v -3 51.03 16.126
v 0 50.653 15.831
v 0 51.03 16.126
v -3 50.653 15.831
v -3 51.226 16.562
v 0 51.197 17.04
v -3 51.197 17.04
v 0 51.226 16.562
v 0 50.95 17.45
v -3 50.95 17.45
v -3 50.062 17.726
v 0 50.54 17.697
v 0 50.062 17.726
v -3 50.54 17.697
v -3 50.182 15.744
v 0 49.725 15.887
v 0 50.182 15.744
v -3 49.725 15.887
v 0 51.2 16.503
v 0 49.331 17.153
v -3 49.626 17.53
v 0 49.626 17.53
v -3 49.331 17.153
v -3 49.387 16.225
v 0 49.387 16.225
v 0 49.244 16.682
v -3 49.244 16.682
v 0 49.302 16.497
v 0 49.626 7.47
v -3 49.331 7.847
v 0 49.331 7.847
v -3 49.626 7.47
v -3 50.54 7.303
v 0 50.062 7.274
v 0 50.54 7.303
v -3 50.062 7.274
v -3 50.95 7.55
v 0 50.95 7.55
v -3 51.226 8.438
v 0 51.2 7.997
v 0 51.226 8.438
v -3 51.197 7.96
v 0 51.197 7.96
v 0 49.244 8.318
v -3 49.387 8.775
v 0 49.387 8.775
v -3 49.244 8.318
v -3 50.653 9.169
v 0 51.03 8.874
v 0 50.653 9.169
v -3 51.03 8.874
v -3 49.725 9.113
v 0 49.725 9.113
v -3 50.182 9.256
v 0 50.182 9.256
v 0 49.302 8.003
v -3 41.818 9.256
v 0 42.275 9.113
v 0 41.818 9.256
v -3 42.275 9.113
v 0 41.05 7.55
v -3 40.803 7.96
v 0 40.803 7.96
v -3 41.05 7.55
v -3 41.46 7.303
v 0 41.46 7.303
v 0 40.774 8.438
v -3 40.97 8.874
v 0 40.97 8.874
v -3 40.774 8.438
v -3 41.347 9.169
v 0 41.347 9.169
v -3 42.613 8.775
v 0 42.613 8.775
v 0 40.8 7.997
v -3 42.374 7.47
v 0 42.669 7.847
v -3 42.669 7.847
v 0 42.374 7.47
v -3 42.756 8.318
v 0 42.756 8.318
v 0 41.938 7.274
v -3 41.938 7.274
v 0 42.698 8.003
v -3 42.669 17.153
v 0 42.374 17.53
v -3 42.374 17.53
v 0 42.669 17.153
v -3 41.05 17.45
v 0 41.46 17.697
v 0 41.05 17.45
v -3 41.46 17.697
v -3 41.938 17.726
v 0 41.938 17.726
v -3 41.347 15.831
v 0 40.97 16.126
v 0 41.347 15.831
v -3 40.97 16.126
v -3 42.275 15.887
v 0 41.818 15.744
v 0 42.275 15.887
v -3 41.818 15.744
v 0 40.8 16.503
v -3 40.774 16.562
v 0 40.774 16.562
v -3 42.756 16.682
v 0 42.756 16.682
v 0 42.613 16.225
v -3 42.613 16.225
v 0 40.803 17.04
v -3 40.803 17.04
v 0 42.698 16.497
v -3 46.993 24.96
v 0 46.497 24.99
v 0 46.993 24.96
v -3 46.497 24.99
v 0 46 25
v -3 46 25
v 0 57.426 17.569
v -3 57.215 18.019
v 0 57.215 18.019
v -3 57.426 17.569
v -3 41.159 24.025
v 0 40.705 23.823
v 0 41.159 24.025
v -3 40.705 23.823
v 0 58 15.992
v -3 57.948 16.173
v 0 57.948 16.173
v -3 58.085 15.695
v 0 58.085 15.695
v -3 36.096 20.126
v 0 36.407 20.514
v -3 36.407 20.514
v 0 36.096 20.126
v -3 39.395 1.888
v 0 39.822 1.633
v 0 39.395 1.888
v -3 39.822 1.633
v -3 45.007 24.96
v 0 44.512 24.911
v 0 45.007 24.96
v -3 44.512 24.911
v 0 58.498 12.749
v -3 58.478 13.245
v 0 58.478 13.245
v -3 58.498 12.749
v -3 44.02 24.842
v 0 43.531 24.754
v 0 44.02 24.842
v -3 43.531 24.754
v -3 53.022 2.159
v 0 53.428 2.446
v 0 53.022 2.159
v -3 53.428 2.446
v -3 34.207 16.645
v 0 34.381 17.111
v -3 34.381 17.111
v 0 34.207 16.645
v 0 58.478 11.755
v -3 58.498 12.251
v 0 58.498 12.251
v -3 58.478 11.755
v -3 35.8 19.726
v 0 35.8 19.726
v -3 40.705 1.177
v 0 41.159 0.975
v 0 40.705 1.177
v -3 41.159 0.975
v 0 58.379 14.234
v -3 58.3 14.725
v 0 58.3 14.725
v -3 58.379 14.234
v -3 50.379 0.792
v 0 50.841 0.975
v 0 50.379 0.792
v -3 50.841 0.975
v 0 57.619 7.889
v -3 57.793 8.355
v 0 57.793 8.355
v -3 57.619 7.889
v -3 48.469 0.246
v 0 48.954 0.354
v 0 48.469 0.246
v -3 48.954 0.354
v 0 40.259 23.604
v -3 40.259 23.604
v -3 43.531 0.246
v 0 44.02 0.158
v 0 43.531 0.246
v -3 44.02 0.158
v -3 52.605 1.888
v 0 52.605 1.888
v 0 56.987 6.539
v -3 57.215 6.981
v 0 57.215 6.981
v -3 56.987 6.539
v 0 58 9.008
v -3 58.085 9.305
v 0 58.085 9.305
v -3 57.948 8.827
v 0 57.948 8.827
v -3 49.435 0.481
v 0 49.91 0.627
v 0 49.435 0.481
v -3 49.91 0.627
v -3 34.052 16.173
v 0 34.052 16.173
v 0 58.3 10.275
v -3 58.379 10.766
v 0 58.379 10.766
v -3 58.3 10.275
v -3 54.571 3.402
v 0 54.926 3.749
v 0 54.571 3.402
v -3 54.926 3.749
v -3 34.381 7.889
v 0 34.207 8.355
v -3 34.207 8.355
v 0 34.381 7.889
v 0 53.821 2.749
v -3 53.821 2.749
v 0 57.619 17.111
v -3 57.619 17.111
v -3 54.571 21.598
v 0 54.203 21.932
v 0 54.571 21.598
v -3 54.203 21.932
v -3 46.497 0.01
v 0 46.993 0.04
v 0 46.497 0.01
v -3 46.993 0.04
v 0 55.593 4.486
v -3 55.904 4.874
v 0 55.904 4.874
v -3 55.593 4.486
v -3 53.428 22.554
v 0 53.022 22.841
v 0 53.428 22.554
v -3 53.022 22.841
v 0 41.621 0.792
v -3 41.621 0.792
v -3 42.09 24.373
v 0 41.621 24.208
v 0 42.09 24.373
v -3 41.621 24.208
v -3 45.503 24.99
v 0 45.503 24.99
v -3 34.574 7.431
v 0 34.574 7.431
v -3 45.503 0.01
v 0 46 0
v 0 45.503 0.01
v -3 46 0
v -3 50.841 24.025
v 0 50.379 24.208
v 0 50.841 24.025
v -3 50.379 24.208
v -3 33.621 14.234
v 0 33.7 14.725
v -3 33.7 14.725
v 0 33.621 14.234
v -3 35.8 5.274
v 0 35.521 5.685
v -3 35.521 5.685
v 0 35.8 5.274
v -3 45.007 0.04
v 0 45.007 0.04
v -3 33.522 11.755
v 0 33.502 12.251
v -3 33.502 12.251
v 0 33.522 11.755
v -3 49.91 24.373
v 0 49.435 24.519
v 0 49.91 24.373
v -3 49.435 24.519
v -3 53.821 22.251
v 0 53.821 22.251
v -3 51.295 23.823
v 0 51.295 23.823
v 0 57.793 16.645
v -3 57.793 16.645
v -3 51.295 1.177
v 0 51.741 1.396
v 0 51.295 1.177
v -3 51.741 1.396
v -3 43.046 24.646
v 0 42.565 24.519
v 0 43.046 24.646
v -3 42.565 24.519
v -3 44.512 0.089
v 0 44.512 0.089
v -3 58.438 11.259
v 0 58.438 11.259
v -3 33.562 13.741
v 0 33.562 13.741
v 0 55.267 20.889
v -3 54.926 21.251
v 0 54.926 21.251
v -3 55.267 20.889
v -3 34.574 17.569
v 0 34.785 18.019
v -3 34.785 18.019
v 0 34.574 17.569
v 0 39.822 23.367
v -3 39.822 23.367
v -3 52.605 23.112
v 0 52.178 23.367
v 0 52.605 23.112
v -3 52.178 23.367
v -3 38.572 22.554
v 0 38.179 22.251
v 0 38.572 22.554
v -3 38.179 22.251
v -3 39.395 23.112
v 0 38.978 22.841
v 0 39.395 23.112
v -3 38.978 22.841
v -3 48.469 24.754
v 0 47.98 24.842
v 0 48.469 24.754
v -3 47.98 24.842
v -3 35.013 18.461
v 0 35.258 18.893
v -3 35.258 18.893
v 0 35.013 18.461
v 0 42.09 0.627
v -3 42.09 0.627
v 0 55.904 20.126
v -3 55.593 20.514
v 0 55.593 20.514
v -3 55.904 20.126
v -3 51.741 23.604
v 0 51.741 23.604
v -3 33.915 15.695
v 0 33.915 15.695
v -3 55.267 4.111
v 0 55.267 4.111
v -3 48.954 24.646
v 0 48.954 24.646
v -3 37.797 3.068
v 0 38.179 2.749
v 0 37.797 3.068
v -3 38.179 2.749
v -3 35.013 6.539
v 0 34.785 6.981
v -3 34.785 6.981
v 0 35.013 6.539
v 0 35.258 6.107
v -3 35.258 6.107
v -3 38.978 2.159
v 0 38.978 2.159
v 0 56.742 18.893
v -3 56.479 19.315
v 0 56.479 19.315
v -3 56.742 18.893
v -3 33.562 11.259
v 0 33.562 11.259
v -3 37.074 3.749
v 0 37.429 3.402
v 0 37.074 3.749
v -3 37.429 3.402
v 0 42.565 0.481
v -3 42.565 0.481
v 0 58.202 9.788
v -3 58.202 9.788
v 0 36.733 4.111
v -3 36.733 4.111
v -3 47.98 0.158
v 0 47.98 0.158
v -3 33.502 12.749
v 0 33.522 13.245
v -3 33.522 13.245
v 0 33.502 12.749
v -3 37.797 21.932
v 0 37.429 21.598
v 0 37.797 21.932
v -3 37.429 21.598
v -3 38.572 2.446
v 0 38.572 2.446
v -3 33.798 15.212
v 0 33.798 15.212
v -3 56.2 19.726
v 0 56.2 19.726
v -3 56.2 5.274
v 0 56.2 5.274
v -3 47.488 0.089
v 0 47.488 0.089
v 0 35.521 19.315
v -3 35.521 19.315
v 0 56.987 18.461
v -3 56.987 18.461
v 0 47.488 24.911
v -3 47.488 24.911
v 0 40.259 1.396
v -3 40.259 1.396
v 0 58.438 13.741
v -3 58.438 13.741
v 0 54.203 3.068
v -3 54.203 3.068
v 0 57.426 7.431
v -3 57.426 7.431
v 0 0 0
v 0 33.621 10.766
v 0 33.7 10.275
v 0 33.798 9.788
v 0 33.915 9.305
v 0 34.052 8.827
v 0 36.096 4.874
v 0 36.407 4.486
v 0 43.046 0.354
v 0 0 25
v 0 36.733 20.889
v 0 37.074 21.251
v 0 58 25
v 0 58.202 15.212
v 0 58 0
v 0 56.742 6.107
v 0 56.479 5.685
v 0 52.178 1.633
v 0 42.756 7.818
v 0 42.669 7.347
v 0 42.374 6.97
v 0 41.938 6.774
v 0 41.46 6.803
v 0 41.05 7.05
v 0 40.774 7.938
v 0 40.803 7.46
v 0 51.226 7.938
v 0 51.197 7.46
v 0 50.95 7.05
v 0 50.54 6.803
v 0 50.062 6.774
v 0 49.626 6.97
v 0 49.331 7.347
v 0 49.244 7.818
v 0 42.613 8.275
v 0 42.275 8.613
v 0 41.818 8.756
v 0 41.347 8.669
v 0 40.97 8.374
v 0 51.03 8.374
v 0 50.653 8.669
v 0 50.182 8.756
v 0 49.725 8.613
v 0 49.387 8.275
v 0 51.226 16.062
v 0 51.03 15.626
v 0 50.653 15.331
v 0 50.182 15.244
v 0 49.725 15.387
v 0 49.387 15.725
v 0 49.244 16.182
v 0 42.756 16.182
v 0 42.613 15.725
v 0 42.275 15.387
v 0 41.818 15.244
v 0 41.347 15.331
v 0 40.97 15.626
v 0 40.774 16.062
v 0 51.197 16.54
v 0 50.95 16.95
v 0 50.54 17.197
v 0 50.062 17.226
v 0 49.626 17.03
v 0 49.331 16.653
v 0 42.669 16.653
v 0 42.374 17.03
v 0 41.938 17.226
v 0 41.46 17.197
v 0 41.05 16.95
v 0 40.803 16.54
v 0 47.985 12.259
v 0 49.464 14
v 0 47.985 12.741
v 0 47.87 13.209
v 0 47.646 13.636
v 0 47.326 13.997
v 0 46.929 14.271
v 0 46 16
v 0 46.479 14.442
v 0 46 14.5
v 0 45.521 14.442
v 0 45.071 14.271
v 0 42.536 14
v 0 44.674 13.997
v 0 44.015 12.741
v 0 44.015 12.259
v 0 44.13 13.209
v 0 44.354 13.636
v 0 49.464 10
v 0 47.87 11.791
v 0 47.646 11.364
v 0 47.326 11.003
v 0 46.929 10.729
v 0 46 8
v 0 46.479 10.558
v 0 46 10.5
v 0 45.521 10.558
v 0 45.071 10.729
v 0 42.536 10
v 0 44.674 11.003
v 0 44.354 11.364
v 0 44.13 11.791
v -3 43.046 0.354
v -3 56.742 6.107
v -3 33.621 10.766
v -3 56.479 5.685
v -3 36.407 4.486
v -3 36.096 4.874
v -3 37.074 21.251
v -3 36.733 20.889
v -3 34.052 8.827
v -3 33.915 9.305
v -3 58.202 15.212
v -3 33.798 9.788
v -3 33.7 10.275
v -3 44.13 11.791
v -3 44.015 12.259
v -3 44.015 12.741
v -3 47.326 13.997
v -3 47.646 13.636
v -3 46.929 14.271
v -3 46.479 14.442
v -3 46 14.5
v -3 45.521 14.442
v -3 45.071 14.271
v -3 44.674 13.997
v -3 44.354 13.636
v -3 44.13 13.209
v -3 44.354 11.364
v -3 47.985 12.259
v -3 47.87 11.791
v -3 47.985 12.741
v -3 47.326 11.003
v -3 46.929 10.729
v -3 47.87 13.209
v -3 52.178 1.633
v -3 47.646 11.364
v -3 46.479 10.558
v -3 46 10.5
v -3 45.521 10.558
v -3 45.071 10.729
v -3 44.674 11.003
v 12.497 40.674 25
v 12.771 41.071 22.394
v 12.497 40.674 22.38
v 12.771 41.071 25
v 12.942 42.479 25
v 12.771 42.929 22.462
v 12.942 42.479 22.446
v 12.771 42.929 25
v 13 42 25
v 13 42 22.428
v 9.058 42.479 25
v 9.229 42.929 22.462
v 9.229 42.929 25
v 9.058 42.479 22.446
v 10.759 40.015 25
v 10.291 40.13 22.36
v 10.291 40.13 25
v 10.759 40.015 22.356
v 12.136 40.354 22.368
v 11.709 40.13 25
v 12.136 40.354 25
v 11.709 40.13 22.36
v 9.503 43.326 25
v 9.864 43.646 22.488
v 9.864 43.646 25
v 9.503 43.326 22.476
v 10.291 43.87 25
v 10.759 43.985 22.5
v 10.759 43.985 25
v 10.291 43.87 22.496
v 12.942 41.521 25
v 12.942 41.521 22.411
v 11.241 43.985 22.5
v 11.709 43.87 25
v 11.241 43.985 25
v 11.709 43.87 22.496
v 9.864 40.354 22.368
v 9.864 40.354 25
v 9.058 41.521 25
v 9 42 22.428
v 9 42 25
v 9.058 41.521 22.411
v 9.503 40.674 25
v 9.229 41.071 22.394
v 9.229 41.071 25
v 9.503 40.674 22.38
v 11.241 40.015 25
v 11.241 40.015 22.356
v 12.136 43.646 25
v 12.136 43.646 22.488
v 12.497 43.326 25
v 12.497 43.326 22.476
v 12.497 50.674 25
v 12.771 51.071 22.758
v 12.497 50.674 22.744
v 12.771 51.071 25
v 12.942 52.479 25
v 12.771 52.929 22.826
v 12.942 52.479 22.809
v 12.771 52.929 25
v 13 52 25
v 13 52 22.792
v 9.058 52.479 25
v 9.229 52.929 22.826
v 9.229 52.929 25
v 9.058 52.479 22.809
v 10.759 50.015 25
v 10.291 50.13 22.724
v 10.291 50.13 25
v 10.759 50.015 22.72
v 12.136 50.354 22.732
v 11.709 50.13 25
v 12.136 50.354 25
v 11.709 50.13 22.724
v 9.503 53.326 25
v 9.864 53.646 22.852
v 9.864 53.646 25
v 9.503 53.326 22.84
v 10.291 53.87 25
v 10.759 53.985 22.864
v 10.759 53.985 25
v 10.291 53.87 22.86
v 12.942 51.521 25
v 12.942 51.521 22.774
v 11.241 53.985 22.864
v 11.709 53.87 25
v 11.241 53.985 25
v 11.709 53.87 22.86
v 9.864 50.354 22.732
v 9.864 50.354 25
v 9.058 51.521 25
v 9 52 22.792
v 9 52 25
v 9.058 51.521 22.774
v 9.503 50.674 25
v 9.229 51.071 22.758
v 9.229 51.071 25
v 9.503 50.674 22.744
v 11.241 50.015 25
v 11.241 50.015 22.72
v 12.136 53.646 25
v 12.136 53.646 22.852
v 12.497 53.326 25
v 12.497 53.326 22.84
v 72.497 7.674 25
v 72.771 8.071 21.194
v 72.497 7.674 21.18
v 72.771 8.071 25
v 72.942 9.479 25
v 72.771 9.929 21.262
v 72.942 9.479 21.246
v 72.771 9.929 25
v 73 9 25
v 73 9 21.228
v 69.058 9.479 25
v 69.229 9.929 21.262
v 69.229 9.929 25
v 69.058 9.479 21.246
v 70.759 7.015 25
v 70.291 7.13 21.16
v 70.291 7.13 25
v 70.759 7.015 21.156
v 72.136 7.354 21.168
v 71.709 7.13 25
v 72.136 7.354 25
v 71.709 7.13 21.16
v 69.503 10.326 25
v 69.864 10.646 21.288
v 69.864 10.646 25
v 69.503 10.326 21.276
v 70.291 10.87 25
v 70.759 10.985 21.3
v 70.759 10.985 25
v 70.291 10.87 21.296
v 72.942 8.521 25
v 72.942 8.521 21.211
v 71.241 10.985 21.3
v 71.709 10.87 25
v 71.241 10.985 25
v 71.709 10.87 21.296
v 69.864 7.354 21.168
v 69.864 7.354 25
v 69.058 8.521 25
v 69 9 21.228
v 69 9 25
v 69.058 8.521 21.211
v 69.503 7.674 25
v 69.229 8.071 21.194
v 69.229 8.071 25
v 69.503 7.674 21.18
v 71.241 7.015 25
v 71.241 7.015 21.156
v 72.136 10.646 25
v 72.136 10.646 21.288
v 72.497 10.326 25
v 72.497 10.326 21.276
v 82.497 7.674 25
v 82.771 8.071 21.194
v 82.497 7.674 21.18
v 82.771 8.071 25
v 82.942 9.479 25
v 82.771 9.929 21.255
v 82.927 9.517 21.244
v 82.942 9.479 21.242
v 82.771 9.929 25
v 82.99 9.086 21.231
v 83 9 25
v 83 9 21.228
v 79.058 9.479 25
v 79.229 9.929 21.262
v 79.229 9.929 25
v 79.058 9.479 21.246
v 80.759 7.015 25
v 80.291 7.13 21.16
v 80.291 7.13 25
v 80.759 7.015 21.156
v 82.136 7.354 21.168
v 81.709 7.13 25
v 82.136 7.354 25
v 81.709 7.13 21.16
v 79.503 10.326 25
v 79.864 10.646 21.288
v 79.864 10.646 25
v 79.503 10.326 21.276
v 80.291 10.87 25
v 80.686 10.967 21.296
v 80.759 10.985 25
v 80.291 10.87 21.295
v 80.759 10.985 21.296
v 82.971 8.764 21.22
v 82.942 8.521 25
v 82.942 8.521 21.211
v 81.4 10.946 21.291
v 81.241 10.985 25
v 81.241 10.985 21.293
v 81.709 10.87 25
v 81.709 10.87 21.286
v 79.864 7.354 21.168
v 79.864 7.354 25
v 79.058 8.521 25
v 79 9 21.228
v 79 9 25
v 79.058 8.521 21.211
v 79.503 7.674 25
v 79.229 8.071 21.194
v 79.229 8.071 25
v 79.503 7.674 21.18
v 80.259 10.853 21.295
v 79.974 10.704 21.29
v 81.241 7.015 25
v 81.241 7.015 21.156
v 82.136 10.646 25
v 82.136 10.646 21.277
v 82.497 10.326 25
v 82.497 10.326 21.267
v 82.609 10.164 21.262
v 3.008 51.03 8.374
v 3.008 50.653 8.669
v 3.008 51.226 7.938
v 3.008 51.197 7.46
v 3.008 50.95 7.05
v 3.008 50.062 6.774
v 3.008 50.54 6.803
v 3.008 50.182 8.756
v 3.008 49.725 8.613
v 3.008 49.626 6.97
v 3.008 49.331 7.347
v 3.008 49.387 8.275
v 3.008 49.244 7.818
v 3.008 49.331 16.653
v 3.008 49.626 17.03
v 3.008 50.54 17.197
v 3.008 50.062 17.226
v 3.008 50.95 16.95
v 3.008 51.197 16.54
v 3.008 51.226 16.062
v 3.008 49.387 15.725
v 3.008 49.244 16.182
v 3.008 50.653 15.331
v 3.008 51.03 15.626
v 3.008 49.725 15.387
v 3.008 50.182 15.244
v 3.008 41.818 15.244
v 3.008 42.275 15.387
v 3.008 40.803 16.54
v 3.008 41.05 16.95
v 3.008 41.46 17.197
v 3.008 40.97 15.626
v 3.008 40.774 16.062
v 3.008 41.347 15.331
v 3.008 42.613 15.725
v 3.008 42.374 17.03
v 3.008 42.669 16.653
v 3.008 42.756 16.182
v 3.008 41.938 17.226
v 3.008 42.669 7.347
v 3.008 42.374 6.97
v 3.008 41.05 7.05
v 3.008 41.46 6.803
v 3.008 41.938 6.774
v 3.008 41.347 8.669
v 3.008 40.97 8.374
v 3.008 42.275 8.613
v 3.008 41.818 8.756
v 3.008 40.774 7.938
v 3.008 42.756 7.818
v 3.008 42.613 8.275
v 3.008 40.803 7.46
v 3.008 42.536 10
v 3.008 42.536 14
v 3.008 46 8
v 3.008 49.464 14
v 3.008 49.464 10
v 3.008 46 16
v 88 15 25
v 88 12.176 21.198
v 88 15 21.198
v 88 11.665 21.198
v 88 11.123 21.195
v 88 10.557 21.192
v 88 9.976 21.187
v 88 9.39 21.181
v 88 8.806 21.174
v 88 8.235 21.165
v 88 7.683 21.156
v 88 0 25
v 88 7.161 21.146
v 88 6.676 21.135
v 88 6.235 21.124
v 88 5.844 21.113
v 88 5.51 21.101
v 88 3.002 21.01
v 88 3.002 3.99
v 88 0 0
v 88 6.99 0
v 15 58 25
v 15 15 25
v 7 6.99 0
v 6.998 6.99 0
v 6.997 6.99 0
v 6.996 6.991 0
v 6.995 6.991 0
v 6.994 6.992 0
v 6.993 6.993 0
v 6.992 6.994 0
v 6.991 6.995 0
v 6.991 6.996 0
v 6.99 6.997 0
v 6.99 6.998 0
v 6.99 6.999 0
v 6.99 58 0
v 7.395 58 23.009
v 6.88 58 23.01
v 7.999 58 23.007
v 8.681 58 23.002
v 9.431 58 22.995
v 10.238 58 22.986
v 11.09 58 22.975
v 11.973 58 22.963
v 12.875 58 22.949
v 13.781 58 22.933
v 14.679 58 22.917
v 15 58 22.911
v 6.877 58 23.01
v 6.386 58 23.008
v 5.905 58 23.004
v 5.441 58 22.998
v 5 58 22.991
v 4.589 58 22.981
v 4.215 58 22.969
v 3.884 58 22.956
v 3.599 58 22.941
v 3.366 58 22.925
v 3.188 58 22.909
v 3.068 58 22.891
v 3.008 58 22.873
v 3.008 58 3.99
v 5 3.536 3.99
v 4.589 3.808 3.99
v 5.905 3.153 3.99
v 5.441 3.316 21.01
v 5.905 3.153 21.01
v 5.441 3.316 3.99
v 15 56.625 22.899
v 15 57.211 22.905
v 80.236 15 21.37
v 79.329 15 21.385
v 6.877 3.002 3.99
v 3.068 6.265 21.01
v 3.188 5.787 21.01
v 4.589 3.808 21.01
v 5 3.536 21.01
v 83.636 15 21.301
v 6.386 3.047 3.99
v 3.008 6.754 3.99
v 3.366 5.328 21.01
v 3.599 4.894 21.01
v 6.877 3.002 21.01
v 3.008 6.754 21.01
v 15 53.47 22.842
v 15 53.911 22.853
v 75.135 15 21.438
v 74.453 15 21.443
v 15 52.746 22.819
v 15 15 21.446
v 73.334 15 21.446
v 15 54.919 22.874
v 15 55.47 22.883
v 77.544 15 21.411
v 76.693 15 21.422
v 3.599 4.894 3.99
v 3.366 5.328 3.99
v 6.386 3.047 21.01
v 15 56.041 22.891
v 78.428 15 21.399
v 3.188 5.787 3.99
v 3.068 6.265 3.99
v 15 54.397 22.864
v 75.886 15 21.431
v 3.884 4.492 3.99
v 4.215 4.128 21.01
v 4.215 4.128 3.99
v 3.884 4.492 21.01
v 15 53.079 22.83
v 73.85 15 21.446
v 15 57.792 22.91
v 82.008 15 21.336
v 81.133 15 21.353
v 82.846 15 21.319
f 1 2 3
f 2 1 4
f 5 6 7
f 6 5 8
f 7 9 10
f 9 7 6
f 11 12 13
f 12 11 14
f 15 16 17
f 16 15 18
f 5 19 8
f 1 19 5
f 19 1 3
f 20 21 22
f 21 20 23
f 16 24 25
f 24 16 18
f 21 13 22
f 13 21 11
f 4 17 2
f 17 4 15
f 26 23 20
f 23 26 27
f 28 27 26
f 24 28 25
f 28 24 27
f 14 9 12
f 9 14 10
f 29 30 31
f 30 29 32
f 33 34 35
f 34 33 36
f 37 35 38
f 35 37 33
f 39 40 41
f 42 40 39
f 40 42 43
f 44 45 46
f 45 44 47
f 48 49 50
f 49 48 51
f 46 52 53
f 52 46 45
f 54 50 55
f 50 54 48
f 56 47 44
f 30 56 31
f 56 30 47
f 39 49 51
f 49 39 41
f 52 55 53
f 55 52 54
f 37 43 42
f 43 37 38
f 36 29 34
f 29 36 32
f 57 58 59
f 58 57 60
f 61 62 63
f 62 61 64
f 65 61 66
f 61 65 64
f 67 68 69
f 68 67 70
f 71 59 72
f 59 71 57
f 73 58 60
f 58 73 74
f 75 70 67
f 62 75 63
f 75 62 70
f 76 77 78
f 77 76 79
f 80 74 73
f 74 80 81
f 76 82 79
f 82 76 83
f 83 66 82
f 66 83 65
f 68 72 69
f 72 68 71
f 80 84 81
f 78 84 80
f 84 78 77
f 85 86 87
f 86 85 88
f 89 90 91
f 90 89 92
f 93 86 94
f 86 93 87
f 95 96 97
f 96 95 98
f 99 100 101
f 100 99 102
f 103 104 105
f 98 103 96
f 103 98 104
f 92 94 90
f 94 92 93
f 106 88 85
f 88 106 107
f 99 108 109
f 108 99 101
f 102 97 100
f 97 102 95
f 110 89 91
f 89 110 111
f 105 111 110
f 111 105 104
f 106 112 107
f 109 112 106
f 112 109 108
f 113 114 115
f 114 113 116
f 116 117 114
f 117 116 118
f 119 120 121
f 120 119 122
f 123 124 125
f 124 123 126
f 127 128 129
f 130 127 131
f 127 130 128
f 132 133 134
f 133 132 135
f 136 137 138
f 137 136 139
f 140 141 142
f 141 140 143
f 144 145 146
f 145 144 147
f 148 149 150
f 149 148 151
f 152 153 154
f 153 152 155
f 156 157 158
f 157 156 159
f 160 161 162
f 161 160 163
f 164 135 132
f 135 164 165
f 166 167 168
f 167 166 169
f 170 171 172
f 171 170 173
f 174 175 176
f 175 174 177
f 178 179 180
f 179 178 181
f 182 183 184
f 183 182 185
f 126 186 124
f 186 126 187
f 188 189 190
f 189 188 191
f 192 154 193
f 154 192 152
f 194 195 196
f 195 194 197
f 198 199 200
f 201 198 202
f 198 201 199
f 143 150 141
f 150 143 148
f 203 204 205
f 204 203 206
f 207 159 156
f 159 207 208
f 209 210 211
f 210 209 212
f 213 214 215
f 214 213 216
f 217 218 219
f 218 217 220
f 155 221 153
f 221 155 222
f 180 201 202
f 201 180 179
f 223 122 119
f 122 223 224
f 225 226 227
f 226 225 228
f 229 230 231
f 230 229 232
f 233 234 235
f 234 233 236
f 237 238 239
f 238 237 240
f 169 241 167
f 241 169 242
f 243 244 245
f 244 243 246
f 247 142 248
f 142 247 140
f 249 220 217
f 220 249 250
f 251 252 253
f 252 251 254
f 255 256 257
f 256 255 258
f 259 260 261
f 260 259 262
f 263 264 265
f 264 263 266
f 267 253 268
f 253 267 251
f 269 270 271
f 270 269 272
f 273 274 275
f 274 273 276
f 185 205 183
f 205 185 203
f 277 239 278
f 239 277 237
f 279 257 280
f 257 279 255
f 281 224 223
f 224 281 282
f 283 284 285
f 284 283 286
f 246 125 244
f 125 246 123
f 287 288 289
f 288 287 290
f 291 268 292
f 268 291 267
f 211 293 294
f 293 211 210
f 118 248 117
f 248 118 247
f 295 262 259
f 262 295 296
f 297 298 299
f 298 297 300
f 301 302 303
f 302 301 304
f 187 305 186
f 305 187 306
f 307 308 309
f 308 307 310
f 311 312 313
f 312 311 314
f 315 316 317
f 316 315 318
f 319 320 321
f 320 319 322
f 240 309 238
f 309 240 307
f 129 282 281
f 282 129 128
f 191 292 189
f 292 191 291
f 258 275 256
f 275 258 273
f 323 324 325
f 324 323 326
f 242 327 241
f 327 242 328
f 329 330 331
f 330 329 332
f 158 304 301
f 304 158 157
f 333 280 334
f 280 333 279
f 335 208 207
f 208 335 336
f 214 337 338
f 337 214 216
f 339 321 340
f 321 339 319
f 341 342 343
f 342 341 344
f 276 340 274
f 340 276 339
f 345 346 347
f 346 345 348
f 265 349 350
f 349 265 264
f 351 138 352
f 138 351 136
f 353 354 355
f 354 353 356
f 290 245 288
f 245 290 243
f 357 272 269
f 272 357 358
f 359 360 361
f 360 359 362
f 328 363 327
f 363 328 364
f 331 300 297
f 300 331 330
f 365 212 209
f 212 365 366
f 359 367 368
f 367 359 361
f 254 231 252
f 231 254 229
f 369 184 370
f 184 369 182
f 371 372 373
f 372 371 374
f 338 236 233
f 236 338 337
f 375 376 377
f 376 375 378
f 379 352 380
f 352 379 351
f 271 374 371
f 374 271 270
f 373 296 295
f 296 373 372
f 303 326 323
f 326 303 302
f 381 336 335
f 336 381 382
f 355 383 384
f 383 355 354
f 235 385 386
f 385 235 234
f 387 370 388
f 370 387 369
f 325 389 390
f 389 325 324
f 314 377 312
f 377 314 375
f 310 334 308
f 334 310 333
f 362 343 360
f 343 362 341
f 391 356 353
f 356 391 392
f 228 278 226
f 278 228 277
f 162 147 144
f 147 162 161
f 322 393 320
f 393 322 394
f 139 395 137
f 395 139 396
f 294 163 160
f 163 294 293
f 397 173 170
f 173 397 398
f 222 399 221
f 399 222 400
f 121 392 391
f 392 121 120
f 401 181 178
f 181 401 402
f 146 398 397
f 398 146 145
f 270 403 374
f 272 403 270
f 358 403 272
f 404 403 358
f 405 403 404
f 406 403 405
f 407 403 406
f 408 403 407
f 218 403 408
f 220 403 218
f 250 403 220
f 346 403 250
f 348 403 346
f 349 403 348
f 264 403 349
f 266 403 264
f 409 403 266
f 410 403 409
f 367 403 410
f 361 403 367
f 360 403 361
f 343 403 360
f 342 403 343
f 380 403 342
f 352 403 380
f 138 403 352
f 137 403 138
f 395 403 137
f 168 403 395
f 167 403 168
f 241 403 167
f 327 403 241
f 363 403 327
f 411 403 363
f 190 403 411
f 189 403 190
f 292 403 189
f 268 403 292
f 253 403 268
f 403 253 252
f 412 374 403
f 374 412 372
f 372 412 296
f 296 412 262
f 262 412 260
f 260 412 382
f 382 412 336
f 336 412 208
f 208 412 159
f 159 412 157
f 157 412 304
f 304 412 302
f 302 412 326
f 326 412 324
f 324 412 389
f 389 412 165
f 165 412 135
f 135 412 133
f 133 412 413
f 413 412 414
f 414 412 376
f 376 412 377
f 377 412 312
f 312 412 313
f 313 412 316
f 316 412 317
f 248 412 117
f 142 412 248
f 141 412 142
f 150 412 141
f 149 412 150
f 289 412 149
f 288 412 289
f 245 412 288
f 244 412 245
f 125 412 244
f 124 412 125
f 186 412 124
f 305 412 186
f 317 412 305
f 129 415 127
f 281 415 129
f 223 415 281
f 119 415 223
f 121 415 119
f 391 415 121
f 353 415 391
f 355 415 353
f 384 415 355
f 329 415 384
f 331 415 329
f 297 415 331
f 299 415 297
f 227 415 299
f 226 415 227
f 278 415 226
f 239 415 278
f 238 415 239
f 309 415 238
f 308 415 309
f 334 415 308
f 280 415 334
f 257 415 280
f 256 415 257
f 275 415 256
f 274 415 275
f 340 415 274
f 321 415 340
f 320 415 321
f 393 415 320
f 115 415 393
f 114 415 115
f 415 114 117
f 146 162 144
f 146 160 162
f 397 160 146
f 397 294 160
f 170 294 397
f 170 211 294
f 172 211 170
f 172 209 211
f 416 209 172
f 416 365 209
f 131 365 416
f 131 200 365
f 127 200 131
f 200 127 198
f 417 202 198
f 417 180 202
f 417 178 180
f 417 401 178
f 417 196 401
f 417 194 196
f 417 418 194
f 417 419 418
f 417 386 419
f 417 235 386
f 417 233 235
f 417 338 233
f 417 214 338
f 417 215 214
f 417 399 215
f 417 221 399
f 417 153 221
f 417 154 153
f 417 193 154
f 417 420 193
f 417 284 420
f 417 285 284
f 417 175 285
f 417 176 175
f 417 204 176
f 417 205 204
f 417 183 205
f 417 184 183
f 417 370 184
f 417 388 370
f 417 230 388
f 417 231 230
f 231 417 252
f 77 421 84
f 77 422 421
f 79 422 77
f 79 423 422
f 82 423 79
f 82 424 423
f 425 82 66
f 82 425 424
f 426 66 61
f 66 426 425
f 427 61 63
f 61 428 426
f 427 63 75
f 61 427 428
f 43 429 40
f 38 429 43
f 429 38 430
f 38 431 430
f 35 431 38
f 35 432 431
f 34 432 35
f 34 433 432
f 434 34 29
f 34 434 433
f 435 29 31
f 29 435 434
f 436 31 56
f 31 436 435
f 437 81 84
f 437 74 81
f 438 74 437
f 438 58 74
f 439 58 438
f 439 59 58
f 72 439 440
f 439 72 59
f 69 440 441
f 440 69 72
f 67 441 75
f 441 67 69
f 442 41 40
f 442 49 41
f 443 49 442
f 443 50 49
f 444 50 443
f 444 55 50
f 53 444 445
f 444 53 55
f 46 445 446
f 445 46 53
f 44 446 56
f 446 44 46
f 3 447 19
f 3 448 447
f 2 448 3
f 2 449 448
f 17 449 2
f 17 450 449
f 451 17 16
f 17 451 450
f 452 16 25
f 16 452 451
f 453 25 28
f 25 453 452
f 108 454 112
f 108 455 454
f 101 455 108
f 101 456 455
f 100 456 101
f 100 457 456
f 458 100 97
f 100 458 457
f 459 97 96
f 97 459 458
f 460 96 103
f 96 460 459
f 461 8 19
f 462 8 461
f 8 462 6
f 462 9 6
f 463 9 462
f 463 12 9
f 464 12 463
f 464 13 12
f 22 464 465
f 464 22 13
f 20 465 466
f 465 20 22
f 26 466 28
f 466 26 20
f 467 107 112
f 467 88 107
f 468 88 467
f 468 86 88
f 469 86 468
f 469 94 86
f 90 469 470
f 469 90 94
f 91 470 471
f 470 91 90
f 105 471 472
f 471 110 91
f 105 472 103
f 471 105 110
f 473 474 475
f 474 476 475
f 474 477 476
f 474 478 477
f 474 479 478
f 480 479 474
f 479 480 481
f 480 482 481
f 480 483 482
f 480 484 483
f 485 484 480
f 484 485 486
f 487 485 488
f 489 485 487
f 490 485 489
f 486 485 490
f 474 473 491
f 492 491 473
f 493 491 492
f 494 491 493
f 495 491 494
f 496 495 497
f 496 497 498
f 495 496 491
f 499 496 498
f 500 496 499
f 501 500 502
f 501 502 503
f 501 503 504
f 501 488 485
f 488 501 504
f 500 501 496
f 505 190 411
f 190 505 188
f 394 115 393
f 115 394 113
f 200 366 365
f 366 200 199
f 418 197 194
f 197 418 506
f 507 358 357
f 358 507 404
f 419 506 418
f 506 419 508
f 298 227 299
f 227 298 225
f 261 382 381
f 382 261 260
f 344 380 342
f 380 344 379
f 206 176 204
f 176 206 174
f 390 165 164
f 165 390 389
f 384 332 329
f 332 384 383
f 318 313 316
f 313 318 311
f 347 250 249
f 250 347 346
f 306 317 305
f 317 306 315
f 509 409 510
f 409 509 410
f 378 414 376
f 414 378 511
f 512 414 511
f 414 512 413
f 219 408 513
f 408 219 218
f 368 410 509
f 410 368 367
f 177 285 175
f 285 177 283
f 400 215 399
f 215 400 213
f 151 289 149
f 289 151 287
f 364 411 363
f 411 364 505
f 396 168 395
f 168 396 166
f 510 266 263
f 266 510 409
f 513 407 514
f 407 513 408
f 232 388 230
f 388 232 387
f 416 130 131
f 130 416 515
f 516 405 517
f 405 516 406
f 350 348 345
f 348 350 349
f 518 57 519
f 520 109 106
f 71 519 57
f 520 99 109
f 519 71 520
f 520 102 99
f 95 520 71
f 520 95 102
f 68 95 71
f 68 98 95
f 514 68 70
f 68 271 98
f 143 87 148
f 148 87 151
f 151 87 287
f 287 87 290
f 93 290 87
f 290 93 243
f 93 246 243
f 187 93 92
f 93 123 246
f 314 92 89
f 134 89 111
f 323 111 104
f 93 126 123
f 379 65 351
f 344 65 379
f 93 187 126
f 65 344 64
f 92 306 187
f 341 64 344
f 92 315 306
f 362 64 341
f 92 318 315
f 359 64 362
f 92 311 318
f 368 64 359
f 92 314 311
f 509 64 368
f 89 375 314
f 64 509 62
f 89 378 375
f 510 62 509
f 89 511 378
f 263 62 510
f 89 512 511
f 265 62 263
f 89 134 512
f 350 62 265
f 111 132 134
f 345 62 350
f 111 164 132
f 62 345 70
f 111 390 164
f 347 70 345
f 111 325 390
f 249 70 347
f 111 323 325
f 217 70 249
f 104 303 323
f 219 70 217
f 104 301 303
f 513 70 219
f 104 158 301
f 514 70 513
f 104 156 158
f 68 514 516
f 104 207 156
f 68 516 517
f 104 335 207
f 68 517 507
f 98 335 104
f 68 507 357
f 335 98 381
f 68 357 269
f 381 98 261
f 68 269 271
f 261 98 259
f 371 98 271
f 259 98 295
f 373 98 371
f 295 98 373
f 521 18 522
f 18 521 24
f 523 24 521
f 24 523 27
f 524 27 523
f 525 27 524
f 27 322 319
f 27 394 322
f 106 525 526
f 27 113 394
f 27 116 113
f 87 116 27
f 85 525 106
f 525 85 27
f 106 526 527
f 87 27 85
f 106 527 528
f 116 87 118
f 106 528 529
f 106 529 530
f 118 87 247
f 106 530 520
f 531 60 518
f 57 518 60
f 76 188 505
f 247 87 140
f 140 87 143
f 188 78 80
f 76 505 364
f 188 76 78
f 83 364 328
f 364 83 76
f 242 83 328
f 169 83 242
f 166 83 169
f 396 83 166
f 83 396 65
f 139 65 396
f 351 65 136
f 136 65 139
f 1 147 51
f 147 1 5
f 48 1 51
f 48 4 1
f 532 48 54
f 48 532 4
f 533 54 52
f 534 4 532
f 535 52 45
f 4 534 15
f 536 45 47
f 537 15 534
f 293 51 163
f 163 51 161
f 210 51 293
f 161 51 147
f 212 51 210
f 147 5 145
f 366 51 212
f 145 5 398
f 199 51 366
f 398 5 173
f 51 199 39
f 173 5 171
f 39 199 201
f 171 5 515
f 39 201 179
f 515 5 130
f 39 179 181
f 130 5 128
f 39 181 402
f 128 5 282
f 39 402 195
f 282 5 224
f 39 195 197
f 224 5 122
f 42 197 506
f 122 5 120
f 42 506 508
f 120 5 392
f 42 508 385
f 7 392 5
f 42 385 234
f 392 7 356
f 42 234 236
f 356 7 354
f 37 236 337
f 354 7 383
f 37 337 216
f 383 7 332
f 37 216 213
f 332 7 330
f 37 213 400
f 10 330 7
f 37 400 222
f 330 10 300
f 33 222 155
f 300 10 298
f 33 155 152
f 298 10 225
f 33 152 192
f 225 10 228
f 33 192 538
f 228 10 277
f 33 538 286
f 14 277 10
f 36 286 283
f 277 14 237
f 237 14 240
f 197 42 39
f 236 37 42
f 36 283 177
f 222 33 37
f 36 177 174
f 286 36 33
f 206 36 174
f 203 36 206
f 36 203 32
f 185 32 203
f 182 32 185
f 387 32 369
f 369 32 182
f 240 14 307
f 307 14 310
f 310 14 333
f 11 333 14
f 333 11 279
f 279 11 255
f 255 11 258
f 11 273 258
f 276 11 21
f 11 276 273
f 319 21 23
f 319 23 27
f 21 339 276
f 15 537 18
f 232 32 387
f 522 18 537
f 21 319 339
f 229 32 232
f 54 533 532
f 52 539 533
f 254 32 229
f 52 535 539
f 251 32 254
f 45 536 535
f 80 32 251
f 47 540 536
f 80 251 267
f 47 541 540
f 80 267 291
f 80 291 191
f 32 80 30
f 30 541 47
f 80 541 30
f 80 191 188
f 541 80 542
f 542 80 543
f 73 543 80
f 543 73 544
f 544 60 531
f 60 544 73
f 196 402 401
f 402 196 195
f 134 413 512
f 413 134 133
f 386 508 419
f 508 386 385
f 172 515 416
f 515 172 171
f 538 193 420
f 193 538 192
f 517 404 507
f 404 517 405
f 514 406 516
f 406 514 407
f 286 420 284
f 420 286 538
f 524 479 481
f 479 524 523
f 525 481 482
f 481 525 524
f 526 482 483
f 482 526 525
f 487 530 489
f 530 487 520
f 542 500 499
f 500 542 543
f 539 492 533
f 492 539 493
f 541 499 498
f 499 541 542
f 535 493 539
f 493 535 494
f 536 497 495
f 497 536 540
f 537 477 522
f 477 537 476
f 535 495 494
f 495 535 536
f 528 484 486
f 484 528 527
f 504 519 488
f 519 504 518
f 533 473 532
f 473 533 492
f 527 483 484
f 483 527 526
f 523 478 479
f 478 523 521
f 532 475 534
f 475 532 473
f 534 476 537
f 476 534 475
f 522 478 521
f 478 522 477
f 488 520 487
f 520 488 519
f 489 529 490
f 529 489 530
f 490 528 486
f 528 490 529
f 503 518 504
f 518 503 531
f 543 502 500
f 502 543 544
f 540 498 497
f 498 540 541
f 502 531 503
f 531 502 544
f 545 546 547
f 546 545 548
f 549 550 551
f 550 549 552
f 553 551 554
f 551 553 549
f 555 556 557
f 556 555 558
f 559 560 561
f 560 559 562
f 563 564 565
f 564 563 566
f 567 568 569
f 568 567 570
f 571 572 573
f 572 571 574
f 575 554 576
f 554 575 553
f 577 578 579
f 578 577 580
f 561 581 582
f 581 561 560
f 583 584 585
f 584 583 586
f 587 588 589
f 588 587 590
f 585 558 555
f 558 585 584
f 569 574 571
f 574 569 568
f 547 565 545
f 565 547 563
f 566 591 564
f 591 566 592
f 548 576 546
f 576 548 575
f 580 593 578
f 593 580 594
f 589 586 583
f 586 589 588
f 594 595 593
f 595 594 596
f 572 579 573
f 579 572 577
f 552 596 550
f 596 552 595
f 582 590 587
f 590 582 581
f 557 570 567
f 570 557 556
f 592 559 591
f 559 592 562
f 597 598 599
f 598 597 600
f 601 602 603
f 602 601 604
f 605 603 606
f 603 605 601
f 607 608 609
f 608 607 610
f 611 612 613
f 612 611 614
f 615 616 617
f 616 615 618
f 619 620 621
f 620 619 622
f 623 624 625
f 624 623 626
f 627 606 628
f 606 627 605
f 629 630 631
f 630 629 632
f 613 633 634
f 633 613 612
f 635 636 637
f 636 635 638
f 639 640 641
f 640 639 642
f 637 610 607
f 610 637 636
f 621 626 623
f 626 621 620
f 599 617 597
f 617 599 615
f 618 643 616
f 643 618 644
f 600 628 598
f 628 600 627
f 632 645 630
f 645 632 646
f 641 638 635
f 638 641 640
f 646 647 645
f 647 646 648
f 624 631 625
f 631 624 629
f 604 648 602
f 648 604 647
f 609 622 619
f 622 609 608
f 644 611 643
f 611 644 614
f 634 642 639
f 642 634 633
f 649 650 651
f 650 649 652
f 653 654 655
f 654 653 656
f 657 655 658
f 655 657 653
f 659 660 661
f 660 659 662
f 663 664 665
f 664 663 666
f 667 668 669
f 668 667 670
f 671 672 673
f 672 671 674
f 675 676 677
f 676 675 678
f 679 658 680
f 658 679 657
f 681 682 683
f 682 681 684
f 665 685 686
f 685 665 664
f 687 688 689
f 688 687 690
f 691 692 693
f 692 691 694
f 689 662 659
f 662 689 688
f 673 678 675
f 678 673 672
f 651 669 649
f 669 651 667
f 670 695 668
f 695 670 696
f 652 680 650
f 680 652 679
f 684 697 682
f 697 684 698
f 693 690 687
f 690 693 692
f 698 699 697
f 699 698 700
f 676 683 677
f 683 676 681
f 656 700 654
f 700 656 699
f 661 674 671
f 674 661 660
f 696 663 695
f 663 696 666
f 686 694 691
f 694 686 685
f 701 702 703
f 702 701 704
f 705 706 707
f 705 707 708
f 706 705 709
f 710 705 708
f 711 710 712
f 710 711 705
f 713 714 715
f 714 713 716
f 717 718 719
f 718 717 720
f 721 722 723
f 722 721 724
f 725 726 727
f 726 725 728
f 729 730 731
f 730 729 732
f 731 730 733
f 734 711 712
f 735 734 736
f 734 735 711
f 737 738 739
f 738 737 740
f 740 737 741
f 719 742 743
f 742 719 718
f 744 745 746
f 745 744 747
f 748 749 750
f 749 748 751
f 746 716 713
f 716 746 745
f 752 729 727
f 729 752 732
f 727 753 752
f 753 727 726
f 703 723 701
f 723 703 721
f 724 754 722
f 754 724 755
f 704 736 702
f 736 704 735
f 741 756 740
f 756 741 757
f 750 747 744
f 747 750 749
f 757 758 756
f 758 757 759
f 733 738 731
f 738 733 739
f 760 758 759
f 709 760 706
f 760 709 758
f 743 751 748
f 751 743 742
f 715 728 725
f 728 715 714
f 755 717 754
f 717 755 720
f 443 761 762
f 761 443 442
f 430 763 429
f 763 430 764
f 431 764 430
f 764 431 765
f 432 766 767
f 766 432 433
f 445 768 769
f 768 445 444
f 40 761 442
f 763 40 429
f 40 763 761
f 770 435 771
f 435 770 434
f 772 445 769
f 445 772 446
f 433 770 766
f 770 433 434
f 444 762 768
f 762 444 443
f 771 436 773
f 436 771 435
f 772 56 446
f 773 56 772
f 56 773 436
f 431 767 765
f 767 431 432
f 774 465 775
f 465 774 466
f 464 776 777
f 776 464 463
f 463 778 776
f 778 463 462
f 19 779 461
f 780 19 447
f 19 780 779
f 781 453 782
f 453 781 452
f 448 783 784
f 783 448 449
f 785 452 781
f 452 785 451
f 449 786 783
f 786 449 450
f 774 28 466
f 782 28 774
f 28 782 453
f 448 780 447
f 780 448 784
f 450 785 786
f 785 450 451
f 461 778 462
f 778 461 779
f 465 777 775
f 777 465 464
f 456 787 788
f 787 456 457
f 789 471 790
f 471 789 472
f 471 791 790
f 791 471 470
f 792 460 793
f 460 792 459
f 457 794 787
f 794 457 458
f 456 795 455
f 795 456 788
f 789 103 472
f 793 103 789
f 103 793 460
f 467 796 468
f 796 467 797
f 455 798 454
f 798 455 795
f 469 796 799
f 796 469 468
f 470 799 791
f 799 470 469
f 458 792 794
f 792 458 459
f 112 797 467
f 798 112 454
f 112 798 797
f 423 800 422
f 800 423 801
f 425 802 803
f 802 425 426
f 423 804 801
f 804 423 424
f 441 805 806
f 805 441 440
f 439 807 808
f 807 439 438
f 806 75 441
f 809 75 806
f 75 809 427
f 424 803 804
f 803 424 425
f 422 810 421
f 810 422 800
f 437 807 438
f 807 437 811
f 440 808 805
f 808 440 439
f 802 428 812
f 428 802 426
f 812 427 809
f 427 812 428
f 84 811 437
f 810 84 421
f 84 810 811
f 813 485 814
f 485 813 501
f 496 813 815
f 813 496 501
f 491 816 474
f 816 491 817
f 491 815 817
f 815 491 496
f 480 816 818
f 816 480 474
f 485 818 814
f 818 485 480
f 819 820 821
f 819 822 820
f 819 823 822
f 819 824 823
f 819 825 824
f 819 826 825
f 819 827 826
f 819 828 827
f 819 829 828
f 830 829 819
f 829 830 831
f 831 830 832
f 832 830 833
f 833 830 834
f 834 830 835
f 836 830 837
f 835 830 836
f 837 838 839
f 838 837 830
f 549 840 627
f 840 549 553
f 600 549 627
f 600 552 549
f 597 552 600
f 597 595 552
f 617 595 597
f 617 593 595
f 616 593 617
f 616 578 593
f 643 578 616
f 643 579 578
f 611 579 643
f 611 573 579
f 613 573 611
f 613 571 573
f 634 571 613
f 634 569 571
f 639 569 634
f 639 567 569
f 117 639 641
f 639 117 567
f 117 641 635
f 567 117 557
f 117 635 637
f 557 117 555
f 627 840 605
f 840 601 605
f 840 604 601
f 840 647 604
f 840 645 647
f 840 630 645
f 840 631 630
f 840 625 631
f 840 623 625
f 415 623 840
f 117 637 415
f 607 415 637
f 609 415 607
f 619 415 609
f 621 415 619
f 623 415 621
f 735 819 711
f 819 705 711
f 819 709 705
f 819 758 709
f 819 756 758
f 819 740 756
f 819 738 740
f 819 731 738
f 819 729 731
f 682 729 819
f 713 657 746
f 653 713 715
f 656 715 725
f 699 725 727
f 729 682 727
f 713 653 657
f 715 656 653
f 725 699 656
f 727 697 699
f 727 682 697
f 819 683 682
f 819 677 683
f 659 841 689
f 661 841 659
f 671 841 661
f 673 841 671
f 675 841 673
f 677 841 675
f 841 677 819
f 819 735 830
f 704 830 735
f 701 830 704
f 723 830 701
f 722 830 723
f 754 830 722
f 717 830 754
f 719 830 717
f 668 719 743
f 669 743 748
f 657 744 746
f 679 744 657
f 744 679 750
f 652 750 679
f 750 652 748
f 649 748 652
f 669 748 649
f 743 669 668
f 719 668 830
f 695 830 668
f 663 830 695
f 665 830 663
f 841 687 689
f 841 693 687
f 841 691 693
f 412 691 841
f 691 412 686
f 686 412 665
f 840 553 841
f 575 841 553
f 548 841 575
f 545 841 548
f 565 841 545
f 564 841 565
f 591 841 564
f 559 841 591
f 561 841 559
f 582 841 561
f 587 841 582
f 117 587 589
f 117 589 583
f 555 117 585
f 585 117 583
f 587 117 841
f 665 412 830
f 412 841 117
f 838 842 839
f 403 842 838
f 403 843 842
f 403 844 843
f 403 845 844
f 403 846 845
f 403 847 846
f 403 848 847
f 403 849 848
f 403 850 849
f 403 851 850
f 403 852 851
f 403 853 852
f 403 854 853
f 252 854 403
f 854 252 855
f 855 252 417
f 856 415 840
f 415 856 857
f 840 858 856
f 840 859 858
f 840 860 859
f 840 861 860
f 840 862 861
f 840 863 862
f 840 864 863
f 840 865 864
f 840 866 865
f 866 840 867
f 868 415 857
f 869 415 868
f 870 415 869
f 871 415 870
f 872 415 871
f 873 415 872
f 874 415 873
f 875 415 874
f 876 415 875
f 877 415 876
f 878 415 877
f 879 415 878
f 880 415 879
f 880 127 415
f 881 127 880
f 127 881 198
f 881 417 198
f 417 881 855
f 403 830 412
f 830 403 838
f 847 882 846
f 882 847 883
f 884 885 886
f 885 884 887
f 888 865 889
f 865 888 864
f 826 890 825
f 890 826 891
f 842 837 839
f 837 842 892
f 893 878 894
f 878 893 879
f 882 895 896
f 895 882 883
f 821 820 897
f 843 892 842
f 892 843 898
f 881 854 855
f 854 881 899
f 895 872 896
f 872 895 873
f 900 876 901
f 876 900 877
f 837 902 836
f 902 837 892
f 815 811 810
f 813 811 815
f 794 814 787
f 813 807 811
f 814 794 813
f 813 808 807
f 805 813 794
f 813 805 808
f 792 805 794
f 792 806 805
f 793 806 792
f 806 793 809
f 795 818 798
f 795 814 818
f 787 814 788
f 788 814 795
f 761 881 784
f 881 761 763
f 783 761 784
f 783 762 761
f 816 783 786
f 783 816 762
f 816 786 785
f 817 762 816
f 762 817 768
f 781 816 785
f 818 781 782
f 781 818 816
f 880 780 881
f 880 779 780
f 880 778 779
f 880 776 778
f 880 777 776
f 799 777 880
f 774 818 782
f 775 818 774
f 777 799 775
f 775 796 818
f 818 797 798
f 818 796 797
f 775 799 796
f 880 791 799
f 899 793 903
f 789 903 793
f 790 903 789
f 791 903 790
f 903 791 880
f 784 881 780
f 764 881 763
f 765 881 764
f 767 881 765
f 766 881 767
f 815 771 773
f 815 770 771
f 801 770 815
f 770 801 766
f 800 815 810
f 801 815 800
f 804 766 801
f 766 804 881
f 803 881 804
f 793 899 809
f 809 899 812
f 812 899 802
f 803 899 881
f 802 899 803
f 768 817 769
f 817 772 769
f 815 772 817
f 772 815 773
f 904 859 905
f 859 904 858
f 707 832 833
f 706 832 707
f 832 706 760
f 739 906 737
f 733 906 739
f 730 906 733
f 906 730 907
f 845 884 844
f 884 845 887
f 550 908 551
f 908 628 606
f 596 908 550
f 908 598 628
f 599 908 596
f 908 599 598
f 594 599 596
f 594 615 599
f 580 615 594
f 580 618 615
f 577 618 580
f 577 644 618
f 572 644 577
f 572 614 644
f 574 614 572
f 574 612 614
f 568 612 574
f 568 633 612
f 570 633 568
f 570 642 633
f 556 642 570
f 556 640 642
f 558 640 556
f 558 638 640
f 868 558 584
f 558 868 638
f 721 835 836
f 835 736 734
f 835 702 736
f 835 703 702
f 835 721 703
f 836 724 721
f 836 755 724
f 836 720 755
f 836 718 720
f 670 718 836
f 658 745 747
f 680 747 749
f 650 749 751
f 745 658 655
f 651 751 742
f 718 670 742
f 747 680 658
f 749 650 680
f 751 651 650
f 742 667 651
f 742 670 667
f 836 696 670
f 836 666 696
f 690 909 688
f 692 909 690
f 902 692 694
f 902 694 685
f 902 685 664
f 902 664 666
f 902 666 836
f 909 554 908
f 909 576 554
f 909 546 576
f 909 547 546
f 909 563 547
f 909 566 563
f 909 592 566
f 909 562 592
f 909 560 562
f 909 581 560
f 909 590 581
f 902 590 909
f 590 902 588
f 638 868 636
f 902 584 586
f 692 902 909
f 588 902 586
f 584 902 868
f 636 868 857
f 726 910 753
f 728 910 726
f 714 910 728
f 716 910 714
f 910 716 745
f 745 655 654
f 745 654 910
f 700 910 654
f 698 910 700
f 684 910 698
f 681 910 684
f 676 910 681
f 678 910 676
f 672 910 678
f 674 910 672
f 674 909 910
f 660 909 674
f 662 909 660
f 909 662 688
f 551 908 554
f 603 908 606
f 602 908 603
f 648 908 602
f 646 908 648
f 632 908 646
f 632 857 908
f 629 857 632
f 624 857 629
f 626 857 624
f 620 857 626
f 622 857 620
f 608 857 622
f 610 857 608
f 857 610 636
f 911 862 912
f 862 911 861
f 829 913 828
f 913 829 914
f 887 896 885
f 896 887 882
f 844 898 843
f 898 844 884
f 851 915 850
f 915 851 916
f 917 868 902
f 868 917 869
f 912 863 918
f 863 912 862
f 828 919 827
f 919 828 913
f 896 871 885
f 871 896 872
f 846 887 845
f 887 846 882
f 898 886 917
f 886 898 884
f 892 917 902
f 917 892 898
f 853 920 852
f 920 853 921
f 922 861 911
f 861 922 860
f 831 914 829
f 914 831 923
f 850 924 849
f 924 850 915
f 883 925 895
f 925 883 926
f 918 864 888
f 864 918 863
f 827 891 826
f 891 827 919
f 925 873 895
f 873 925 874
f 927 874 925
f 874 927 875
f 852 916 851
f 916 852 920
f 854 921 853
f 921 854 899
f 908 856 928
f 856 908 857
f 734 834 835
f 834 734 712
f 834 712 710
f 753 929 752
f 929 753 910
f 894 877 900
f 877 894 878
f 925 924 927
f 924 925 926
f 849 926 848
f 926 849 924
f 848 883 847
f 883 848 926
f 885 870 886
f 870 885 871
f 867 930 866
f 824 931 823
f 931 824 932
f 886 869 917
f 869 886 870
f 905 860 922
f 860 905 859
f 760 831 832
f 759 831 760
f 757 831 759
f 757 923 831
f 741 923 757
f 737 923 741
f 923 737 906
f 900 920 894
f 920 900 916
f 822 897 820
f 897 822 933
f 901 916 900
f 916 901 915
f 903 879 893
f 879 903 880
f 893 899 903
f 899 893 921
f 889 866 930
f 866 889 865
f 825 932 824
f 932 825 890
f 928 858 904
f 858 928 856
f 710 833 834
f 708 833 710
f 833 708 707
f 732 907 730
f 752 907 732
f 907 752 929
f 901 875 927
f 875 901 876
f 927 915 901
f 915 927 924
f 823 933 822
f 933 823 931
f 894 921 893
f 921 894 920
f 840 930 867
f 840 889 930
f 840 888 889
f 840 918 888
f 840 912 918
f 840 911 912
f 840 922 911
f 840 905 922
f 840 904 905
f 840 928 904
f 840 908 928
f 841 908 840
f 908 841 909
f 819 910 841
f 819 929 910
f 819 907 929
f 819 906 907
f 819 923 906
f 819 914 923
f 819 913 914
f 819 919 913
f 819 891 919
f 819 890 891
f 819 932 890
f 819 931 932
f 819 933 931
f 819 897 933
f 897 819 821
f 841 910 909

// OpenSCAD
//Bracket for holding Cytronix CM6 HDMI external monitor
width=85;
height=55;
wall=3;
depth=21;
taper=4;
$fa=1/1;
$fs=1/2;
bissl=1/100;
d_bolt=4;
d_nut=8;
h_nut=4;
bcd=12;
n_screws=4;
d_circle=2;
back_plate=4;
module bracket() {
  difference() {
    cube([width+wall,height+wall,depth+back_plate]);
    hull() {
      for (t=[[taper+wall,taper+wall,0],[taper+wall+width,taper+wall,0],[taper+wall+width,taper+wall+height,0],[taper+wall,taper+wall+height,0],[taper+wall,taper+wall+height,2]]) translate(t) {
        translate([0,0,-bissl])cylinder(d1=0,d2=2*taper,h=taper);
        translate([0,0,taper-bissl]) cylinder(d=2*taper,h=depth-taper+2*bissl);
        *translate([0,0,depth-taper+bissl])cylinder(d2=0,d1=2*taper,h=taper);
      }
    }
    translate([wall+taper+8,wall+taper+8,depth-bissl])cube([width,height,back_plate+2*bissl]);
    translate([wall+taper,wall+taper,depth-bissl]) {
      for (tr=[[4,35,0],[4,45,0],[64,2,0],[74,2,0]]) translate(tr)cylinder(h=back_plate+2*bissl,d=4);
    }
    translate([0,46,wall/2+depth/2])rotate([0,90,0]) translate([0,0,-bissl]) {
    cylinder(h=h_nut+2*bissl, d=d_nut,$fn=6);
    for (i=[180/n_screws:360/n_screws:360]) rotate([0,0,i])translate([bcd/2,0,-0.01]) cylinder(h=2*wall+0.02,d=d_circle);
    }
  }
}
module rosette_mount() {
difference() {
  cylinder(h=wall,d=depth+back_plate);
  *translate([0,0,-bissl]) cylinder(h=h_nut+2*bissl, d=d_nut,$fn=6);
  translate([0,0,-bissl]) cylinder(h=wall+2*bissl, d=d_bolt);
  for (i=[180/n_screws:360/n_screws:360]) rotate([0,0,i])translate([bcd/2,0,-0.01]) cylinder(h=2*wall+0.02,d=d_circle);
}
}
translate([0,46,back_plate/2+depth/2])rotate([0,-90,0])rosette_mount();
bracket();
